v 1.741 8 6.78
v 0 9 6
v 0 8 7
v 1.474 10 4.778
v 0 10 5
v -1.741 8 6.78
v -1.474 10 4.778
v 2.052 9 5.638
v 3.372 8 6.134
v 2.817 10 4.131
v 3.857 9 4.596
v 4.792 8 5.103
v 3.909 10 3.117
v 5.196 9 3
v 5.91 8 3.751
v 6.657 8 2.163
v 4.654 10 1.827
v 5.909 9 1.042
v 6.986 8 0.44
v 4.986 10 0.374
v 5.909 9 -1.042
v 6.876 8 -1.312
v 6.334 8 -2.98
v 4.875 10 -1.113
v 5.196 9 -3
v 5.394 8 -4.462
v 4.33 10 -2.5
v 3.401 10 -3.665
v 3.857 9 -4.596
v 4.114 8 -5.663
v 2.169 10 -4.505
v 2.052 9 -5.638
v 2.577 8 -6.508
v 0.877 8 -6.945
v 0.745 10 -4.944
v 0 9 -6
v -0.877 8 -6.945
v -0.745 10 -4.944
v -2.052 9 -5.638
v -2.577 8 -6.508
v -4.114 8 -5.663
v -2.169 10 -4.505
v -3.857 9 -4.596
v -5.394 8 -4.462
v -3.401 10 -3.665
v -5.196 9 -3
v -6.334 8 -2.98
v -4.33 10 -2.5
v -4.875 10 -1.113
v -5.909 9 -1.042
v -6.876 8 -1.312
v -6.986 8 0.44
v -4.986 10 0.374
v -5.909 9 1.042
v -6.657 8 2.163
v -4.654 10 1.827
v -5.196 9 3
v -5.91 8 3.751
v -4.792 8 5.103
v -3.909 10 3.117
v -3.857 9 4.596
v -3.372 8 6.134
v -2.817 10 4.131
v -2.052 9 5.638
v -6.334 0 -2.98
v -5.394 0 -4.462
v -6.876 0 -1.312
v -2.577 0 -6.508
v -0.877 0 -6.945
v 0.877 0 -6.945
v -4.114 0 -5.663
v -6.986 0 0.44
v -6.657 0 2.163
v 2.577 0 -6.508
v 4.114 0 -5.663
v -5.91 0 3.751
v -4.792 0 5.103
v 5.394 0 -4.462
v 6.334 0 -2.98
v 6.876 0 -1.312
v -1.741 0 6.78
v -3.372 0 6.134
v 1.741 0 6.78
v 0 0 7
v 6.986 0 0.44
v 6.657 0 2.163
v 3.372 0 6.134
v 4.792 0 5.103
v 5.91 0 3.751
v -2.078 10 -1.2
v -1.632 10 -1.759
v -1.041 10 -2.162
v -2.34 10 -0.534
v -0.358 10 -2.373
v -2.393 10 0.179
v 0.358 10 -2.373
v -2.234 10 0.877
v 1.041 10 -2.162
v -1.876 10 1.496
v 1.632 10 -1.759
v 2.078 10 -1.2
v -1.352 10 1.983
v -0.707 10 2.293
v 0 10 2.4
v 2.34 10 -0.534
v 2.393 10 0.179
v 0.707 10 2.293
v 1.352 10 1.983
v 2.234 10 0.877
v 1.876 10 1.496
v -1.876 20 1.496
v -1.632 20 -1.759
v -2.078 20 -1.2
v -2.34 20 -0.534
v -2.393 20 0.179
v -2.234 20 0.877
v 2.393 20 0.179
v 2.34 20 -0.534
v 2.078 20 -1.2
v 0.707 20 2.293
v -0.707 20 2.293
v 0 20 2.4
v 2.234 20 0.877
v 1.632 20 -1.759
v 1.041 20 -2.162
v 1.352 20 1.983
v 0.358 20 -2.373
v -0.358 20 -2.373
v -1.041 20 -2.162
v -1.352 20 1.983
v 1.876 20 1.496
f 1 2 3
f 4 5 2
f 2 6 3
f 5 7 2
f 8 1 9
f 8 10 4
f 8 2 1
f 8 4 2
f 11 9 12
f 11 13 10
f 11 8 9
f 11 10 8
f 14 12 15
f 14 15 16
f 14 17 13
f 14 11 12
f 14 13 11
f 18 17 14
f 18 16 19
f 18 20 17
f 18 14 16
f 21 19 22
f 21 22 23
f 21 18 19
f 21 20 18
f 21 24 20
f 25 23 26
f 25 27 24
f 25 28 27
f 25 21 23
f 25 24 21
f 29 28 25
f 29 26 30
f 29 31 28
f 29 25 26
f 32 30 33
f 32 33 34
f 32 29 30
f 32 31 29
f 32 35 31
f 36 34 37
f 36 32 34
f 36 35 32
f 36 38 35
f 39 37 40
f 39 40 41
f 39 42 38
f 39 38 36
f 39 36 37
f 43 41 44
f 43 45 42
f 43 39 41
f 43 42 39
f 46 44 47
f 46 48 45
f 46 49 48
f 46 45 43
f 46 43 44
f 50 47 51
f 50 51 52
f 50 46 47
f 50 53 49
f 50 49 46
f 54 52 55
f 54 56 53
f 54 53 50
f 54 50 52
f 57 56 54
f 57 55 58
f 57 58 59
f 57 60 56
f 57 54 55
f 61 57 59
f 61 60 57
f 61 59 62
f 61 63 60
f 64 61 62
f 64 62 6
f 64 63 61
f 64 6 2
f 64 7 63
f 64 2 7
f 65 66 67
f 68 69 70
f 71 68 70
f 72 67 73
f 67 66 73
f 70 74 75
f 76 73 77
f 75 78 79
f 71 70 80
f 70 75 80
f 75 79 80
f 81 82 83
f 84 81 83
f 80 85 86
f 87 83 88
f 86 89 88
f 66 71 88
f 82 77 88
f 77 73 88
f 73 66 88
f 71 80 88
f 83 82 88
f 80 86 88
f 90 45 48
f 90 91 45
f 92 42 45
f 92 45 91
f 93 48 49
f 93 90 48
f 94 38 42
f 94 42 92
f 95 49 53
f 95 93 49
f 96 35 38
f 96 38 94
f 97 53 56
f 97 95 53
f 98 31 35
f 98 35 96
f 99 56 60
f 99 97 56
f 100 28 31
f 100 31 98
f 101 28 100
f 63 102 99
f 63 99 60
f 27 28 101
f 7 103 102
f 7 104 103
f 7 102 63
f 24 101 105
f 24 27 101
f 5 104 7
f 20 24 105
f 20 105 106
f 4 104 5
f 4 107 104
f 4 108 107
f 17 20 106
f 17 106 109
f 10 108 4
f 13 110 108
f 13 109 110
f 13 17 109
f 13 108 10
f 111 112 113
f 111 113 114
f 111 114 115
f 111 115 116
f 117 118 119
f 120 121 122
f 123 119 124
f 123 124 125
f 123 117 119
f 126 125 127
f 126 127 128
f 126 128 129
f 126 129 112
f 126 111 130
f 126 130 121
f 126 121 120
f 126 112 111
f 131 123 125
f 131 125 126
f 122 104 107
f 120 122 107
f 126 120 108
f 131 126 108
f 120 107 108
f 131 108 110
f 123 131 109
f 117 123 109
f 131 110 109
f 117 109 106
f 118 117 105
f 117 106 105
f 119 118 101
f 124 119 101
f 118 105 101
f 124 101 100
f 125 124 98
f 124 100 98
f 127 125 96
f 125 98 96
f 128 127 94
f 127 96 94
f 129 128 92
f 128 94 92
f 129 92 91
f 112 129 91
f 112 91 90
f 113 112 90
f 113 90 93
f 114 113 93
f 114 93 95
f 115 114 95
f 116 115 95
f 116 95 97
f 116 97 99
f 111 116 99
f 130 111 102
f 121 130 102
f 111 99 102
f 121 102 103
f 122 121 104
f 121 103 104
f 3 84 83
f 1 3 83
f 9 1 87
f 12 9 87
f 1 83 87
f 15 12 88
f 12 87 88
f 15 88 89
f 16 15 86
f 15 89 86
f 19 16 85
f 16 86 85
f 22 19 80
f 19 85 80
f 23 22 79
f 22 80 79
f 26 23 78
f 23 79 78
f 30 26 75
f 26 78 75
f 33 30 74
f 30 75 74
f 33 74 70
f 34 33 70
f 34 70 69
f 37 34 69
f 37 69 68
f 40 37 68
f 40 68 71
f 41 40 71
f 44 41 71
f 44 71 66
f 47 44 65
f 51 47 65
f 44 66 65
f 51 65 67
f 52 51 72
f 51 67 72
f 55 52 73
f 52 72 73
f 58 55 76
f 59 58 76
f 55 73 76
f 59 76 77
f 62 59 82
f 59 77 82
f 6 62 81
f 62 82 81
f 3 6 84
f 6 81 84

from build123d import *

# Parameters (mm, degrees)
SKETCH1_R           = 7
BOSS_EXTRUDE1_DEPTH = 10
CHAMFER1_SIZE       = 2
SKETCH2_R           = 2.4
BOSS_EXTRUDE2_DEPTH = 10


with BuildPart() as part:
    # Sketch1 → Boss-Extrude1 (new body)
    with BuildSketch(Plane(origin=(0, 0, 0), x_dir=(1, 0, 0), z_dir=(0, 1, 0))):
        with Locations(Location((0, 0, 0), (0, 0, 270))):
            Circle(SKETCH1_R)
    extrude(amount=BOSS_EXTRUDE1_DEPTH)

    # Chamfer1
    chamfer1_edges = [part.edges().sort_by_distance(p)[0] for p in [
        (0, 10, -7),
    ]]
    chamfer(chamfer1_edges, length=CHAMFER1_SIZE)

    # Sketch2 → Boss-Extrude2 (add)
    with BuildSketch(Plane(origin=(0, 10, 0), x_dir=(1, 0, 0), z_dir=(0, 1, 0))):
        with Locations(Location((0, 0, 0), (0, 0, 270))):
            Circle(SKETCH2_R)
    extrude(amount=BOSS_EXTRUDE2_DEPTH)


solid = part.part
